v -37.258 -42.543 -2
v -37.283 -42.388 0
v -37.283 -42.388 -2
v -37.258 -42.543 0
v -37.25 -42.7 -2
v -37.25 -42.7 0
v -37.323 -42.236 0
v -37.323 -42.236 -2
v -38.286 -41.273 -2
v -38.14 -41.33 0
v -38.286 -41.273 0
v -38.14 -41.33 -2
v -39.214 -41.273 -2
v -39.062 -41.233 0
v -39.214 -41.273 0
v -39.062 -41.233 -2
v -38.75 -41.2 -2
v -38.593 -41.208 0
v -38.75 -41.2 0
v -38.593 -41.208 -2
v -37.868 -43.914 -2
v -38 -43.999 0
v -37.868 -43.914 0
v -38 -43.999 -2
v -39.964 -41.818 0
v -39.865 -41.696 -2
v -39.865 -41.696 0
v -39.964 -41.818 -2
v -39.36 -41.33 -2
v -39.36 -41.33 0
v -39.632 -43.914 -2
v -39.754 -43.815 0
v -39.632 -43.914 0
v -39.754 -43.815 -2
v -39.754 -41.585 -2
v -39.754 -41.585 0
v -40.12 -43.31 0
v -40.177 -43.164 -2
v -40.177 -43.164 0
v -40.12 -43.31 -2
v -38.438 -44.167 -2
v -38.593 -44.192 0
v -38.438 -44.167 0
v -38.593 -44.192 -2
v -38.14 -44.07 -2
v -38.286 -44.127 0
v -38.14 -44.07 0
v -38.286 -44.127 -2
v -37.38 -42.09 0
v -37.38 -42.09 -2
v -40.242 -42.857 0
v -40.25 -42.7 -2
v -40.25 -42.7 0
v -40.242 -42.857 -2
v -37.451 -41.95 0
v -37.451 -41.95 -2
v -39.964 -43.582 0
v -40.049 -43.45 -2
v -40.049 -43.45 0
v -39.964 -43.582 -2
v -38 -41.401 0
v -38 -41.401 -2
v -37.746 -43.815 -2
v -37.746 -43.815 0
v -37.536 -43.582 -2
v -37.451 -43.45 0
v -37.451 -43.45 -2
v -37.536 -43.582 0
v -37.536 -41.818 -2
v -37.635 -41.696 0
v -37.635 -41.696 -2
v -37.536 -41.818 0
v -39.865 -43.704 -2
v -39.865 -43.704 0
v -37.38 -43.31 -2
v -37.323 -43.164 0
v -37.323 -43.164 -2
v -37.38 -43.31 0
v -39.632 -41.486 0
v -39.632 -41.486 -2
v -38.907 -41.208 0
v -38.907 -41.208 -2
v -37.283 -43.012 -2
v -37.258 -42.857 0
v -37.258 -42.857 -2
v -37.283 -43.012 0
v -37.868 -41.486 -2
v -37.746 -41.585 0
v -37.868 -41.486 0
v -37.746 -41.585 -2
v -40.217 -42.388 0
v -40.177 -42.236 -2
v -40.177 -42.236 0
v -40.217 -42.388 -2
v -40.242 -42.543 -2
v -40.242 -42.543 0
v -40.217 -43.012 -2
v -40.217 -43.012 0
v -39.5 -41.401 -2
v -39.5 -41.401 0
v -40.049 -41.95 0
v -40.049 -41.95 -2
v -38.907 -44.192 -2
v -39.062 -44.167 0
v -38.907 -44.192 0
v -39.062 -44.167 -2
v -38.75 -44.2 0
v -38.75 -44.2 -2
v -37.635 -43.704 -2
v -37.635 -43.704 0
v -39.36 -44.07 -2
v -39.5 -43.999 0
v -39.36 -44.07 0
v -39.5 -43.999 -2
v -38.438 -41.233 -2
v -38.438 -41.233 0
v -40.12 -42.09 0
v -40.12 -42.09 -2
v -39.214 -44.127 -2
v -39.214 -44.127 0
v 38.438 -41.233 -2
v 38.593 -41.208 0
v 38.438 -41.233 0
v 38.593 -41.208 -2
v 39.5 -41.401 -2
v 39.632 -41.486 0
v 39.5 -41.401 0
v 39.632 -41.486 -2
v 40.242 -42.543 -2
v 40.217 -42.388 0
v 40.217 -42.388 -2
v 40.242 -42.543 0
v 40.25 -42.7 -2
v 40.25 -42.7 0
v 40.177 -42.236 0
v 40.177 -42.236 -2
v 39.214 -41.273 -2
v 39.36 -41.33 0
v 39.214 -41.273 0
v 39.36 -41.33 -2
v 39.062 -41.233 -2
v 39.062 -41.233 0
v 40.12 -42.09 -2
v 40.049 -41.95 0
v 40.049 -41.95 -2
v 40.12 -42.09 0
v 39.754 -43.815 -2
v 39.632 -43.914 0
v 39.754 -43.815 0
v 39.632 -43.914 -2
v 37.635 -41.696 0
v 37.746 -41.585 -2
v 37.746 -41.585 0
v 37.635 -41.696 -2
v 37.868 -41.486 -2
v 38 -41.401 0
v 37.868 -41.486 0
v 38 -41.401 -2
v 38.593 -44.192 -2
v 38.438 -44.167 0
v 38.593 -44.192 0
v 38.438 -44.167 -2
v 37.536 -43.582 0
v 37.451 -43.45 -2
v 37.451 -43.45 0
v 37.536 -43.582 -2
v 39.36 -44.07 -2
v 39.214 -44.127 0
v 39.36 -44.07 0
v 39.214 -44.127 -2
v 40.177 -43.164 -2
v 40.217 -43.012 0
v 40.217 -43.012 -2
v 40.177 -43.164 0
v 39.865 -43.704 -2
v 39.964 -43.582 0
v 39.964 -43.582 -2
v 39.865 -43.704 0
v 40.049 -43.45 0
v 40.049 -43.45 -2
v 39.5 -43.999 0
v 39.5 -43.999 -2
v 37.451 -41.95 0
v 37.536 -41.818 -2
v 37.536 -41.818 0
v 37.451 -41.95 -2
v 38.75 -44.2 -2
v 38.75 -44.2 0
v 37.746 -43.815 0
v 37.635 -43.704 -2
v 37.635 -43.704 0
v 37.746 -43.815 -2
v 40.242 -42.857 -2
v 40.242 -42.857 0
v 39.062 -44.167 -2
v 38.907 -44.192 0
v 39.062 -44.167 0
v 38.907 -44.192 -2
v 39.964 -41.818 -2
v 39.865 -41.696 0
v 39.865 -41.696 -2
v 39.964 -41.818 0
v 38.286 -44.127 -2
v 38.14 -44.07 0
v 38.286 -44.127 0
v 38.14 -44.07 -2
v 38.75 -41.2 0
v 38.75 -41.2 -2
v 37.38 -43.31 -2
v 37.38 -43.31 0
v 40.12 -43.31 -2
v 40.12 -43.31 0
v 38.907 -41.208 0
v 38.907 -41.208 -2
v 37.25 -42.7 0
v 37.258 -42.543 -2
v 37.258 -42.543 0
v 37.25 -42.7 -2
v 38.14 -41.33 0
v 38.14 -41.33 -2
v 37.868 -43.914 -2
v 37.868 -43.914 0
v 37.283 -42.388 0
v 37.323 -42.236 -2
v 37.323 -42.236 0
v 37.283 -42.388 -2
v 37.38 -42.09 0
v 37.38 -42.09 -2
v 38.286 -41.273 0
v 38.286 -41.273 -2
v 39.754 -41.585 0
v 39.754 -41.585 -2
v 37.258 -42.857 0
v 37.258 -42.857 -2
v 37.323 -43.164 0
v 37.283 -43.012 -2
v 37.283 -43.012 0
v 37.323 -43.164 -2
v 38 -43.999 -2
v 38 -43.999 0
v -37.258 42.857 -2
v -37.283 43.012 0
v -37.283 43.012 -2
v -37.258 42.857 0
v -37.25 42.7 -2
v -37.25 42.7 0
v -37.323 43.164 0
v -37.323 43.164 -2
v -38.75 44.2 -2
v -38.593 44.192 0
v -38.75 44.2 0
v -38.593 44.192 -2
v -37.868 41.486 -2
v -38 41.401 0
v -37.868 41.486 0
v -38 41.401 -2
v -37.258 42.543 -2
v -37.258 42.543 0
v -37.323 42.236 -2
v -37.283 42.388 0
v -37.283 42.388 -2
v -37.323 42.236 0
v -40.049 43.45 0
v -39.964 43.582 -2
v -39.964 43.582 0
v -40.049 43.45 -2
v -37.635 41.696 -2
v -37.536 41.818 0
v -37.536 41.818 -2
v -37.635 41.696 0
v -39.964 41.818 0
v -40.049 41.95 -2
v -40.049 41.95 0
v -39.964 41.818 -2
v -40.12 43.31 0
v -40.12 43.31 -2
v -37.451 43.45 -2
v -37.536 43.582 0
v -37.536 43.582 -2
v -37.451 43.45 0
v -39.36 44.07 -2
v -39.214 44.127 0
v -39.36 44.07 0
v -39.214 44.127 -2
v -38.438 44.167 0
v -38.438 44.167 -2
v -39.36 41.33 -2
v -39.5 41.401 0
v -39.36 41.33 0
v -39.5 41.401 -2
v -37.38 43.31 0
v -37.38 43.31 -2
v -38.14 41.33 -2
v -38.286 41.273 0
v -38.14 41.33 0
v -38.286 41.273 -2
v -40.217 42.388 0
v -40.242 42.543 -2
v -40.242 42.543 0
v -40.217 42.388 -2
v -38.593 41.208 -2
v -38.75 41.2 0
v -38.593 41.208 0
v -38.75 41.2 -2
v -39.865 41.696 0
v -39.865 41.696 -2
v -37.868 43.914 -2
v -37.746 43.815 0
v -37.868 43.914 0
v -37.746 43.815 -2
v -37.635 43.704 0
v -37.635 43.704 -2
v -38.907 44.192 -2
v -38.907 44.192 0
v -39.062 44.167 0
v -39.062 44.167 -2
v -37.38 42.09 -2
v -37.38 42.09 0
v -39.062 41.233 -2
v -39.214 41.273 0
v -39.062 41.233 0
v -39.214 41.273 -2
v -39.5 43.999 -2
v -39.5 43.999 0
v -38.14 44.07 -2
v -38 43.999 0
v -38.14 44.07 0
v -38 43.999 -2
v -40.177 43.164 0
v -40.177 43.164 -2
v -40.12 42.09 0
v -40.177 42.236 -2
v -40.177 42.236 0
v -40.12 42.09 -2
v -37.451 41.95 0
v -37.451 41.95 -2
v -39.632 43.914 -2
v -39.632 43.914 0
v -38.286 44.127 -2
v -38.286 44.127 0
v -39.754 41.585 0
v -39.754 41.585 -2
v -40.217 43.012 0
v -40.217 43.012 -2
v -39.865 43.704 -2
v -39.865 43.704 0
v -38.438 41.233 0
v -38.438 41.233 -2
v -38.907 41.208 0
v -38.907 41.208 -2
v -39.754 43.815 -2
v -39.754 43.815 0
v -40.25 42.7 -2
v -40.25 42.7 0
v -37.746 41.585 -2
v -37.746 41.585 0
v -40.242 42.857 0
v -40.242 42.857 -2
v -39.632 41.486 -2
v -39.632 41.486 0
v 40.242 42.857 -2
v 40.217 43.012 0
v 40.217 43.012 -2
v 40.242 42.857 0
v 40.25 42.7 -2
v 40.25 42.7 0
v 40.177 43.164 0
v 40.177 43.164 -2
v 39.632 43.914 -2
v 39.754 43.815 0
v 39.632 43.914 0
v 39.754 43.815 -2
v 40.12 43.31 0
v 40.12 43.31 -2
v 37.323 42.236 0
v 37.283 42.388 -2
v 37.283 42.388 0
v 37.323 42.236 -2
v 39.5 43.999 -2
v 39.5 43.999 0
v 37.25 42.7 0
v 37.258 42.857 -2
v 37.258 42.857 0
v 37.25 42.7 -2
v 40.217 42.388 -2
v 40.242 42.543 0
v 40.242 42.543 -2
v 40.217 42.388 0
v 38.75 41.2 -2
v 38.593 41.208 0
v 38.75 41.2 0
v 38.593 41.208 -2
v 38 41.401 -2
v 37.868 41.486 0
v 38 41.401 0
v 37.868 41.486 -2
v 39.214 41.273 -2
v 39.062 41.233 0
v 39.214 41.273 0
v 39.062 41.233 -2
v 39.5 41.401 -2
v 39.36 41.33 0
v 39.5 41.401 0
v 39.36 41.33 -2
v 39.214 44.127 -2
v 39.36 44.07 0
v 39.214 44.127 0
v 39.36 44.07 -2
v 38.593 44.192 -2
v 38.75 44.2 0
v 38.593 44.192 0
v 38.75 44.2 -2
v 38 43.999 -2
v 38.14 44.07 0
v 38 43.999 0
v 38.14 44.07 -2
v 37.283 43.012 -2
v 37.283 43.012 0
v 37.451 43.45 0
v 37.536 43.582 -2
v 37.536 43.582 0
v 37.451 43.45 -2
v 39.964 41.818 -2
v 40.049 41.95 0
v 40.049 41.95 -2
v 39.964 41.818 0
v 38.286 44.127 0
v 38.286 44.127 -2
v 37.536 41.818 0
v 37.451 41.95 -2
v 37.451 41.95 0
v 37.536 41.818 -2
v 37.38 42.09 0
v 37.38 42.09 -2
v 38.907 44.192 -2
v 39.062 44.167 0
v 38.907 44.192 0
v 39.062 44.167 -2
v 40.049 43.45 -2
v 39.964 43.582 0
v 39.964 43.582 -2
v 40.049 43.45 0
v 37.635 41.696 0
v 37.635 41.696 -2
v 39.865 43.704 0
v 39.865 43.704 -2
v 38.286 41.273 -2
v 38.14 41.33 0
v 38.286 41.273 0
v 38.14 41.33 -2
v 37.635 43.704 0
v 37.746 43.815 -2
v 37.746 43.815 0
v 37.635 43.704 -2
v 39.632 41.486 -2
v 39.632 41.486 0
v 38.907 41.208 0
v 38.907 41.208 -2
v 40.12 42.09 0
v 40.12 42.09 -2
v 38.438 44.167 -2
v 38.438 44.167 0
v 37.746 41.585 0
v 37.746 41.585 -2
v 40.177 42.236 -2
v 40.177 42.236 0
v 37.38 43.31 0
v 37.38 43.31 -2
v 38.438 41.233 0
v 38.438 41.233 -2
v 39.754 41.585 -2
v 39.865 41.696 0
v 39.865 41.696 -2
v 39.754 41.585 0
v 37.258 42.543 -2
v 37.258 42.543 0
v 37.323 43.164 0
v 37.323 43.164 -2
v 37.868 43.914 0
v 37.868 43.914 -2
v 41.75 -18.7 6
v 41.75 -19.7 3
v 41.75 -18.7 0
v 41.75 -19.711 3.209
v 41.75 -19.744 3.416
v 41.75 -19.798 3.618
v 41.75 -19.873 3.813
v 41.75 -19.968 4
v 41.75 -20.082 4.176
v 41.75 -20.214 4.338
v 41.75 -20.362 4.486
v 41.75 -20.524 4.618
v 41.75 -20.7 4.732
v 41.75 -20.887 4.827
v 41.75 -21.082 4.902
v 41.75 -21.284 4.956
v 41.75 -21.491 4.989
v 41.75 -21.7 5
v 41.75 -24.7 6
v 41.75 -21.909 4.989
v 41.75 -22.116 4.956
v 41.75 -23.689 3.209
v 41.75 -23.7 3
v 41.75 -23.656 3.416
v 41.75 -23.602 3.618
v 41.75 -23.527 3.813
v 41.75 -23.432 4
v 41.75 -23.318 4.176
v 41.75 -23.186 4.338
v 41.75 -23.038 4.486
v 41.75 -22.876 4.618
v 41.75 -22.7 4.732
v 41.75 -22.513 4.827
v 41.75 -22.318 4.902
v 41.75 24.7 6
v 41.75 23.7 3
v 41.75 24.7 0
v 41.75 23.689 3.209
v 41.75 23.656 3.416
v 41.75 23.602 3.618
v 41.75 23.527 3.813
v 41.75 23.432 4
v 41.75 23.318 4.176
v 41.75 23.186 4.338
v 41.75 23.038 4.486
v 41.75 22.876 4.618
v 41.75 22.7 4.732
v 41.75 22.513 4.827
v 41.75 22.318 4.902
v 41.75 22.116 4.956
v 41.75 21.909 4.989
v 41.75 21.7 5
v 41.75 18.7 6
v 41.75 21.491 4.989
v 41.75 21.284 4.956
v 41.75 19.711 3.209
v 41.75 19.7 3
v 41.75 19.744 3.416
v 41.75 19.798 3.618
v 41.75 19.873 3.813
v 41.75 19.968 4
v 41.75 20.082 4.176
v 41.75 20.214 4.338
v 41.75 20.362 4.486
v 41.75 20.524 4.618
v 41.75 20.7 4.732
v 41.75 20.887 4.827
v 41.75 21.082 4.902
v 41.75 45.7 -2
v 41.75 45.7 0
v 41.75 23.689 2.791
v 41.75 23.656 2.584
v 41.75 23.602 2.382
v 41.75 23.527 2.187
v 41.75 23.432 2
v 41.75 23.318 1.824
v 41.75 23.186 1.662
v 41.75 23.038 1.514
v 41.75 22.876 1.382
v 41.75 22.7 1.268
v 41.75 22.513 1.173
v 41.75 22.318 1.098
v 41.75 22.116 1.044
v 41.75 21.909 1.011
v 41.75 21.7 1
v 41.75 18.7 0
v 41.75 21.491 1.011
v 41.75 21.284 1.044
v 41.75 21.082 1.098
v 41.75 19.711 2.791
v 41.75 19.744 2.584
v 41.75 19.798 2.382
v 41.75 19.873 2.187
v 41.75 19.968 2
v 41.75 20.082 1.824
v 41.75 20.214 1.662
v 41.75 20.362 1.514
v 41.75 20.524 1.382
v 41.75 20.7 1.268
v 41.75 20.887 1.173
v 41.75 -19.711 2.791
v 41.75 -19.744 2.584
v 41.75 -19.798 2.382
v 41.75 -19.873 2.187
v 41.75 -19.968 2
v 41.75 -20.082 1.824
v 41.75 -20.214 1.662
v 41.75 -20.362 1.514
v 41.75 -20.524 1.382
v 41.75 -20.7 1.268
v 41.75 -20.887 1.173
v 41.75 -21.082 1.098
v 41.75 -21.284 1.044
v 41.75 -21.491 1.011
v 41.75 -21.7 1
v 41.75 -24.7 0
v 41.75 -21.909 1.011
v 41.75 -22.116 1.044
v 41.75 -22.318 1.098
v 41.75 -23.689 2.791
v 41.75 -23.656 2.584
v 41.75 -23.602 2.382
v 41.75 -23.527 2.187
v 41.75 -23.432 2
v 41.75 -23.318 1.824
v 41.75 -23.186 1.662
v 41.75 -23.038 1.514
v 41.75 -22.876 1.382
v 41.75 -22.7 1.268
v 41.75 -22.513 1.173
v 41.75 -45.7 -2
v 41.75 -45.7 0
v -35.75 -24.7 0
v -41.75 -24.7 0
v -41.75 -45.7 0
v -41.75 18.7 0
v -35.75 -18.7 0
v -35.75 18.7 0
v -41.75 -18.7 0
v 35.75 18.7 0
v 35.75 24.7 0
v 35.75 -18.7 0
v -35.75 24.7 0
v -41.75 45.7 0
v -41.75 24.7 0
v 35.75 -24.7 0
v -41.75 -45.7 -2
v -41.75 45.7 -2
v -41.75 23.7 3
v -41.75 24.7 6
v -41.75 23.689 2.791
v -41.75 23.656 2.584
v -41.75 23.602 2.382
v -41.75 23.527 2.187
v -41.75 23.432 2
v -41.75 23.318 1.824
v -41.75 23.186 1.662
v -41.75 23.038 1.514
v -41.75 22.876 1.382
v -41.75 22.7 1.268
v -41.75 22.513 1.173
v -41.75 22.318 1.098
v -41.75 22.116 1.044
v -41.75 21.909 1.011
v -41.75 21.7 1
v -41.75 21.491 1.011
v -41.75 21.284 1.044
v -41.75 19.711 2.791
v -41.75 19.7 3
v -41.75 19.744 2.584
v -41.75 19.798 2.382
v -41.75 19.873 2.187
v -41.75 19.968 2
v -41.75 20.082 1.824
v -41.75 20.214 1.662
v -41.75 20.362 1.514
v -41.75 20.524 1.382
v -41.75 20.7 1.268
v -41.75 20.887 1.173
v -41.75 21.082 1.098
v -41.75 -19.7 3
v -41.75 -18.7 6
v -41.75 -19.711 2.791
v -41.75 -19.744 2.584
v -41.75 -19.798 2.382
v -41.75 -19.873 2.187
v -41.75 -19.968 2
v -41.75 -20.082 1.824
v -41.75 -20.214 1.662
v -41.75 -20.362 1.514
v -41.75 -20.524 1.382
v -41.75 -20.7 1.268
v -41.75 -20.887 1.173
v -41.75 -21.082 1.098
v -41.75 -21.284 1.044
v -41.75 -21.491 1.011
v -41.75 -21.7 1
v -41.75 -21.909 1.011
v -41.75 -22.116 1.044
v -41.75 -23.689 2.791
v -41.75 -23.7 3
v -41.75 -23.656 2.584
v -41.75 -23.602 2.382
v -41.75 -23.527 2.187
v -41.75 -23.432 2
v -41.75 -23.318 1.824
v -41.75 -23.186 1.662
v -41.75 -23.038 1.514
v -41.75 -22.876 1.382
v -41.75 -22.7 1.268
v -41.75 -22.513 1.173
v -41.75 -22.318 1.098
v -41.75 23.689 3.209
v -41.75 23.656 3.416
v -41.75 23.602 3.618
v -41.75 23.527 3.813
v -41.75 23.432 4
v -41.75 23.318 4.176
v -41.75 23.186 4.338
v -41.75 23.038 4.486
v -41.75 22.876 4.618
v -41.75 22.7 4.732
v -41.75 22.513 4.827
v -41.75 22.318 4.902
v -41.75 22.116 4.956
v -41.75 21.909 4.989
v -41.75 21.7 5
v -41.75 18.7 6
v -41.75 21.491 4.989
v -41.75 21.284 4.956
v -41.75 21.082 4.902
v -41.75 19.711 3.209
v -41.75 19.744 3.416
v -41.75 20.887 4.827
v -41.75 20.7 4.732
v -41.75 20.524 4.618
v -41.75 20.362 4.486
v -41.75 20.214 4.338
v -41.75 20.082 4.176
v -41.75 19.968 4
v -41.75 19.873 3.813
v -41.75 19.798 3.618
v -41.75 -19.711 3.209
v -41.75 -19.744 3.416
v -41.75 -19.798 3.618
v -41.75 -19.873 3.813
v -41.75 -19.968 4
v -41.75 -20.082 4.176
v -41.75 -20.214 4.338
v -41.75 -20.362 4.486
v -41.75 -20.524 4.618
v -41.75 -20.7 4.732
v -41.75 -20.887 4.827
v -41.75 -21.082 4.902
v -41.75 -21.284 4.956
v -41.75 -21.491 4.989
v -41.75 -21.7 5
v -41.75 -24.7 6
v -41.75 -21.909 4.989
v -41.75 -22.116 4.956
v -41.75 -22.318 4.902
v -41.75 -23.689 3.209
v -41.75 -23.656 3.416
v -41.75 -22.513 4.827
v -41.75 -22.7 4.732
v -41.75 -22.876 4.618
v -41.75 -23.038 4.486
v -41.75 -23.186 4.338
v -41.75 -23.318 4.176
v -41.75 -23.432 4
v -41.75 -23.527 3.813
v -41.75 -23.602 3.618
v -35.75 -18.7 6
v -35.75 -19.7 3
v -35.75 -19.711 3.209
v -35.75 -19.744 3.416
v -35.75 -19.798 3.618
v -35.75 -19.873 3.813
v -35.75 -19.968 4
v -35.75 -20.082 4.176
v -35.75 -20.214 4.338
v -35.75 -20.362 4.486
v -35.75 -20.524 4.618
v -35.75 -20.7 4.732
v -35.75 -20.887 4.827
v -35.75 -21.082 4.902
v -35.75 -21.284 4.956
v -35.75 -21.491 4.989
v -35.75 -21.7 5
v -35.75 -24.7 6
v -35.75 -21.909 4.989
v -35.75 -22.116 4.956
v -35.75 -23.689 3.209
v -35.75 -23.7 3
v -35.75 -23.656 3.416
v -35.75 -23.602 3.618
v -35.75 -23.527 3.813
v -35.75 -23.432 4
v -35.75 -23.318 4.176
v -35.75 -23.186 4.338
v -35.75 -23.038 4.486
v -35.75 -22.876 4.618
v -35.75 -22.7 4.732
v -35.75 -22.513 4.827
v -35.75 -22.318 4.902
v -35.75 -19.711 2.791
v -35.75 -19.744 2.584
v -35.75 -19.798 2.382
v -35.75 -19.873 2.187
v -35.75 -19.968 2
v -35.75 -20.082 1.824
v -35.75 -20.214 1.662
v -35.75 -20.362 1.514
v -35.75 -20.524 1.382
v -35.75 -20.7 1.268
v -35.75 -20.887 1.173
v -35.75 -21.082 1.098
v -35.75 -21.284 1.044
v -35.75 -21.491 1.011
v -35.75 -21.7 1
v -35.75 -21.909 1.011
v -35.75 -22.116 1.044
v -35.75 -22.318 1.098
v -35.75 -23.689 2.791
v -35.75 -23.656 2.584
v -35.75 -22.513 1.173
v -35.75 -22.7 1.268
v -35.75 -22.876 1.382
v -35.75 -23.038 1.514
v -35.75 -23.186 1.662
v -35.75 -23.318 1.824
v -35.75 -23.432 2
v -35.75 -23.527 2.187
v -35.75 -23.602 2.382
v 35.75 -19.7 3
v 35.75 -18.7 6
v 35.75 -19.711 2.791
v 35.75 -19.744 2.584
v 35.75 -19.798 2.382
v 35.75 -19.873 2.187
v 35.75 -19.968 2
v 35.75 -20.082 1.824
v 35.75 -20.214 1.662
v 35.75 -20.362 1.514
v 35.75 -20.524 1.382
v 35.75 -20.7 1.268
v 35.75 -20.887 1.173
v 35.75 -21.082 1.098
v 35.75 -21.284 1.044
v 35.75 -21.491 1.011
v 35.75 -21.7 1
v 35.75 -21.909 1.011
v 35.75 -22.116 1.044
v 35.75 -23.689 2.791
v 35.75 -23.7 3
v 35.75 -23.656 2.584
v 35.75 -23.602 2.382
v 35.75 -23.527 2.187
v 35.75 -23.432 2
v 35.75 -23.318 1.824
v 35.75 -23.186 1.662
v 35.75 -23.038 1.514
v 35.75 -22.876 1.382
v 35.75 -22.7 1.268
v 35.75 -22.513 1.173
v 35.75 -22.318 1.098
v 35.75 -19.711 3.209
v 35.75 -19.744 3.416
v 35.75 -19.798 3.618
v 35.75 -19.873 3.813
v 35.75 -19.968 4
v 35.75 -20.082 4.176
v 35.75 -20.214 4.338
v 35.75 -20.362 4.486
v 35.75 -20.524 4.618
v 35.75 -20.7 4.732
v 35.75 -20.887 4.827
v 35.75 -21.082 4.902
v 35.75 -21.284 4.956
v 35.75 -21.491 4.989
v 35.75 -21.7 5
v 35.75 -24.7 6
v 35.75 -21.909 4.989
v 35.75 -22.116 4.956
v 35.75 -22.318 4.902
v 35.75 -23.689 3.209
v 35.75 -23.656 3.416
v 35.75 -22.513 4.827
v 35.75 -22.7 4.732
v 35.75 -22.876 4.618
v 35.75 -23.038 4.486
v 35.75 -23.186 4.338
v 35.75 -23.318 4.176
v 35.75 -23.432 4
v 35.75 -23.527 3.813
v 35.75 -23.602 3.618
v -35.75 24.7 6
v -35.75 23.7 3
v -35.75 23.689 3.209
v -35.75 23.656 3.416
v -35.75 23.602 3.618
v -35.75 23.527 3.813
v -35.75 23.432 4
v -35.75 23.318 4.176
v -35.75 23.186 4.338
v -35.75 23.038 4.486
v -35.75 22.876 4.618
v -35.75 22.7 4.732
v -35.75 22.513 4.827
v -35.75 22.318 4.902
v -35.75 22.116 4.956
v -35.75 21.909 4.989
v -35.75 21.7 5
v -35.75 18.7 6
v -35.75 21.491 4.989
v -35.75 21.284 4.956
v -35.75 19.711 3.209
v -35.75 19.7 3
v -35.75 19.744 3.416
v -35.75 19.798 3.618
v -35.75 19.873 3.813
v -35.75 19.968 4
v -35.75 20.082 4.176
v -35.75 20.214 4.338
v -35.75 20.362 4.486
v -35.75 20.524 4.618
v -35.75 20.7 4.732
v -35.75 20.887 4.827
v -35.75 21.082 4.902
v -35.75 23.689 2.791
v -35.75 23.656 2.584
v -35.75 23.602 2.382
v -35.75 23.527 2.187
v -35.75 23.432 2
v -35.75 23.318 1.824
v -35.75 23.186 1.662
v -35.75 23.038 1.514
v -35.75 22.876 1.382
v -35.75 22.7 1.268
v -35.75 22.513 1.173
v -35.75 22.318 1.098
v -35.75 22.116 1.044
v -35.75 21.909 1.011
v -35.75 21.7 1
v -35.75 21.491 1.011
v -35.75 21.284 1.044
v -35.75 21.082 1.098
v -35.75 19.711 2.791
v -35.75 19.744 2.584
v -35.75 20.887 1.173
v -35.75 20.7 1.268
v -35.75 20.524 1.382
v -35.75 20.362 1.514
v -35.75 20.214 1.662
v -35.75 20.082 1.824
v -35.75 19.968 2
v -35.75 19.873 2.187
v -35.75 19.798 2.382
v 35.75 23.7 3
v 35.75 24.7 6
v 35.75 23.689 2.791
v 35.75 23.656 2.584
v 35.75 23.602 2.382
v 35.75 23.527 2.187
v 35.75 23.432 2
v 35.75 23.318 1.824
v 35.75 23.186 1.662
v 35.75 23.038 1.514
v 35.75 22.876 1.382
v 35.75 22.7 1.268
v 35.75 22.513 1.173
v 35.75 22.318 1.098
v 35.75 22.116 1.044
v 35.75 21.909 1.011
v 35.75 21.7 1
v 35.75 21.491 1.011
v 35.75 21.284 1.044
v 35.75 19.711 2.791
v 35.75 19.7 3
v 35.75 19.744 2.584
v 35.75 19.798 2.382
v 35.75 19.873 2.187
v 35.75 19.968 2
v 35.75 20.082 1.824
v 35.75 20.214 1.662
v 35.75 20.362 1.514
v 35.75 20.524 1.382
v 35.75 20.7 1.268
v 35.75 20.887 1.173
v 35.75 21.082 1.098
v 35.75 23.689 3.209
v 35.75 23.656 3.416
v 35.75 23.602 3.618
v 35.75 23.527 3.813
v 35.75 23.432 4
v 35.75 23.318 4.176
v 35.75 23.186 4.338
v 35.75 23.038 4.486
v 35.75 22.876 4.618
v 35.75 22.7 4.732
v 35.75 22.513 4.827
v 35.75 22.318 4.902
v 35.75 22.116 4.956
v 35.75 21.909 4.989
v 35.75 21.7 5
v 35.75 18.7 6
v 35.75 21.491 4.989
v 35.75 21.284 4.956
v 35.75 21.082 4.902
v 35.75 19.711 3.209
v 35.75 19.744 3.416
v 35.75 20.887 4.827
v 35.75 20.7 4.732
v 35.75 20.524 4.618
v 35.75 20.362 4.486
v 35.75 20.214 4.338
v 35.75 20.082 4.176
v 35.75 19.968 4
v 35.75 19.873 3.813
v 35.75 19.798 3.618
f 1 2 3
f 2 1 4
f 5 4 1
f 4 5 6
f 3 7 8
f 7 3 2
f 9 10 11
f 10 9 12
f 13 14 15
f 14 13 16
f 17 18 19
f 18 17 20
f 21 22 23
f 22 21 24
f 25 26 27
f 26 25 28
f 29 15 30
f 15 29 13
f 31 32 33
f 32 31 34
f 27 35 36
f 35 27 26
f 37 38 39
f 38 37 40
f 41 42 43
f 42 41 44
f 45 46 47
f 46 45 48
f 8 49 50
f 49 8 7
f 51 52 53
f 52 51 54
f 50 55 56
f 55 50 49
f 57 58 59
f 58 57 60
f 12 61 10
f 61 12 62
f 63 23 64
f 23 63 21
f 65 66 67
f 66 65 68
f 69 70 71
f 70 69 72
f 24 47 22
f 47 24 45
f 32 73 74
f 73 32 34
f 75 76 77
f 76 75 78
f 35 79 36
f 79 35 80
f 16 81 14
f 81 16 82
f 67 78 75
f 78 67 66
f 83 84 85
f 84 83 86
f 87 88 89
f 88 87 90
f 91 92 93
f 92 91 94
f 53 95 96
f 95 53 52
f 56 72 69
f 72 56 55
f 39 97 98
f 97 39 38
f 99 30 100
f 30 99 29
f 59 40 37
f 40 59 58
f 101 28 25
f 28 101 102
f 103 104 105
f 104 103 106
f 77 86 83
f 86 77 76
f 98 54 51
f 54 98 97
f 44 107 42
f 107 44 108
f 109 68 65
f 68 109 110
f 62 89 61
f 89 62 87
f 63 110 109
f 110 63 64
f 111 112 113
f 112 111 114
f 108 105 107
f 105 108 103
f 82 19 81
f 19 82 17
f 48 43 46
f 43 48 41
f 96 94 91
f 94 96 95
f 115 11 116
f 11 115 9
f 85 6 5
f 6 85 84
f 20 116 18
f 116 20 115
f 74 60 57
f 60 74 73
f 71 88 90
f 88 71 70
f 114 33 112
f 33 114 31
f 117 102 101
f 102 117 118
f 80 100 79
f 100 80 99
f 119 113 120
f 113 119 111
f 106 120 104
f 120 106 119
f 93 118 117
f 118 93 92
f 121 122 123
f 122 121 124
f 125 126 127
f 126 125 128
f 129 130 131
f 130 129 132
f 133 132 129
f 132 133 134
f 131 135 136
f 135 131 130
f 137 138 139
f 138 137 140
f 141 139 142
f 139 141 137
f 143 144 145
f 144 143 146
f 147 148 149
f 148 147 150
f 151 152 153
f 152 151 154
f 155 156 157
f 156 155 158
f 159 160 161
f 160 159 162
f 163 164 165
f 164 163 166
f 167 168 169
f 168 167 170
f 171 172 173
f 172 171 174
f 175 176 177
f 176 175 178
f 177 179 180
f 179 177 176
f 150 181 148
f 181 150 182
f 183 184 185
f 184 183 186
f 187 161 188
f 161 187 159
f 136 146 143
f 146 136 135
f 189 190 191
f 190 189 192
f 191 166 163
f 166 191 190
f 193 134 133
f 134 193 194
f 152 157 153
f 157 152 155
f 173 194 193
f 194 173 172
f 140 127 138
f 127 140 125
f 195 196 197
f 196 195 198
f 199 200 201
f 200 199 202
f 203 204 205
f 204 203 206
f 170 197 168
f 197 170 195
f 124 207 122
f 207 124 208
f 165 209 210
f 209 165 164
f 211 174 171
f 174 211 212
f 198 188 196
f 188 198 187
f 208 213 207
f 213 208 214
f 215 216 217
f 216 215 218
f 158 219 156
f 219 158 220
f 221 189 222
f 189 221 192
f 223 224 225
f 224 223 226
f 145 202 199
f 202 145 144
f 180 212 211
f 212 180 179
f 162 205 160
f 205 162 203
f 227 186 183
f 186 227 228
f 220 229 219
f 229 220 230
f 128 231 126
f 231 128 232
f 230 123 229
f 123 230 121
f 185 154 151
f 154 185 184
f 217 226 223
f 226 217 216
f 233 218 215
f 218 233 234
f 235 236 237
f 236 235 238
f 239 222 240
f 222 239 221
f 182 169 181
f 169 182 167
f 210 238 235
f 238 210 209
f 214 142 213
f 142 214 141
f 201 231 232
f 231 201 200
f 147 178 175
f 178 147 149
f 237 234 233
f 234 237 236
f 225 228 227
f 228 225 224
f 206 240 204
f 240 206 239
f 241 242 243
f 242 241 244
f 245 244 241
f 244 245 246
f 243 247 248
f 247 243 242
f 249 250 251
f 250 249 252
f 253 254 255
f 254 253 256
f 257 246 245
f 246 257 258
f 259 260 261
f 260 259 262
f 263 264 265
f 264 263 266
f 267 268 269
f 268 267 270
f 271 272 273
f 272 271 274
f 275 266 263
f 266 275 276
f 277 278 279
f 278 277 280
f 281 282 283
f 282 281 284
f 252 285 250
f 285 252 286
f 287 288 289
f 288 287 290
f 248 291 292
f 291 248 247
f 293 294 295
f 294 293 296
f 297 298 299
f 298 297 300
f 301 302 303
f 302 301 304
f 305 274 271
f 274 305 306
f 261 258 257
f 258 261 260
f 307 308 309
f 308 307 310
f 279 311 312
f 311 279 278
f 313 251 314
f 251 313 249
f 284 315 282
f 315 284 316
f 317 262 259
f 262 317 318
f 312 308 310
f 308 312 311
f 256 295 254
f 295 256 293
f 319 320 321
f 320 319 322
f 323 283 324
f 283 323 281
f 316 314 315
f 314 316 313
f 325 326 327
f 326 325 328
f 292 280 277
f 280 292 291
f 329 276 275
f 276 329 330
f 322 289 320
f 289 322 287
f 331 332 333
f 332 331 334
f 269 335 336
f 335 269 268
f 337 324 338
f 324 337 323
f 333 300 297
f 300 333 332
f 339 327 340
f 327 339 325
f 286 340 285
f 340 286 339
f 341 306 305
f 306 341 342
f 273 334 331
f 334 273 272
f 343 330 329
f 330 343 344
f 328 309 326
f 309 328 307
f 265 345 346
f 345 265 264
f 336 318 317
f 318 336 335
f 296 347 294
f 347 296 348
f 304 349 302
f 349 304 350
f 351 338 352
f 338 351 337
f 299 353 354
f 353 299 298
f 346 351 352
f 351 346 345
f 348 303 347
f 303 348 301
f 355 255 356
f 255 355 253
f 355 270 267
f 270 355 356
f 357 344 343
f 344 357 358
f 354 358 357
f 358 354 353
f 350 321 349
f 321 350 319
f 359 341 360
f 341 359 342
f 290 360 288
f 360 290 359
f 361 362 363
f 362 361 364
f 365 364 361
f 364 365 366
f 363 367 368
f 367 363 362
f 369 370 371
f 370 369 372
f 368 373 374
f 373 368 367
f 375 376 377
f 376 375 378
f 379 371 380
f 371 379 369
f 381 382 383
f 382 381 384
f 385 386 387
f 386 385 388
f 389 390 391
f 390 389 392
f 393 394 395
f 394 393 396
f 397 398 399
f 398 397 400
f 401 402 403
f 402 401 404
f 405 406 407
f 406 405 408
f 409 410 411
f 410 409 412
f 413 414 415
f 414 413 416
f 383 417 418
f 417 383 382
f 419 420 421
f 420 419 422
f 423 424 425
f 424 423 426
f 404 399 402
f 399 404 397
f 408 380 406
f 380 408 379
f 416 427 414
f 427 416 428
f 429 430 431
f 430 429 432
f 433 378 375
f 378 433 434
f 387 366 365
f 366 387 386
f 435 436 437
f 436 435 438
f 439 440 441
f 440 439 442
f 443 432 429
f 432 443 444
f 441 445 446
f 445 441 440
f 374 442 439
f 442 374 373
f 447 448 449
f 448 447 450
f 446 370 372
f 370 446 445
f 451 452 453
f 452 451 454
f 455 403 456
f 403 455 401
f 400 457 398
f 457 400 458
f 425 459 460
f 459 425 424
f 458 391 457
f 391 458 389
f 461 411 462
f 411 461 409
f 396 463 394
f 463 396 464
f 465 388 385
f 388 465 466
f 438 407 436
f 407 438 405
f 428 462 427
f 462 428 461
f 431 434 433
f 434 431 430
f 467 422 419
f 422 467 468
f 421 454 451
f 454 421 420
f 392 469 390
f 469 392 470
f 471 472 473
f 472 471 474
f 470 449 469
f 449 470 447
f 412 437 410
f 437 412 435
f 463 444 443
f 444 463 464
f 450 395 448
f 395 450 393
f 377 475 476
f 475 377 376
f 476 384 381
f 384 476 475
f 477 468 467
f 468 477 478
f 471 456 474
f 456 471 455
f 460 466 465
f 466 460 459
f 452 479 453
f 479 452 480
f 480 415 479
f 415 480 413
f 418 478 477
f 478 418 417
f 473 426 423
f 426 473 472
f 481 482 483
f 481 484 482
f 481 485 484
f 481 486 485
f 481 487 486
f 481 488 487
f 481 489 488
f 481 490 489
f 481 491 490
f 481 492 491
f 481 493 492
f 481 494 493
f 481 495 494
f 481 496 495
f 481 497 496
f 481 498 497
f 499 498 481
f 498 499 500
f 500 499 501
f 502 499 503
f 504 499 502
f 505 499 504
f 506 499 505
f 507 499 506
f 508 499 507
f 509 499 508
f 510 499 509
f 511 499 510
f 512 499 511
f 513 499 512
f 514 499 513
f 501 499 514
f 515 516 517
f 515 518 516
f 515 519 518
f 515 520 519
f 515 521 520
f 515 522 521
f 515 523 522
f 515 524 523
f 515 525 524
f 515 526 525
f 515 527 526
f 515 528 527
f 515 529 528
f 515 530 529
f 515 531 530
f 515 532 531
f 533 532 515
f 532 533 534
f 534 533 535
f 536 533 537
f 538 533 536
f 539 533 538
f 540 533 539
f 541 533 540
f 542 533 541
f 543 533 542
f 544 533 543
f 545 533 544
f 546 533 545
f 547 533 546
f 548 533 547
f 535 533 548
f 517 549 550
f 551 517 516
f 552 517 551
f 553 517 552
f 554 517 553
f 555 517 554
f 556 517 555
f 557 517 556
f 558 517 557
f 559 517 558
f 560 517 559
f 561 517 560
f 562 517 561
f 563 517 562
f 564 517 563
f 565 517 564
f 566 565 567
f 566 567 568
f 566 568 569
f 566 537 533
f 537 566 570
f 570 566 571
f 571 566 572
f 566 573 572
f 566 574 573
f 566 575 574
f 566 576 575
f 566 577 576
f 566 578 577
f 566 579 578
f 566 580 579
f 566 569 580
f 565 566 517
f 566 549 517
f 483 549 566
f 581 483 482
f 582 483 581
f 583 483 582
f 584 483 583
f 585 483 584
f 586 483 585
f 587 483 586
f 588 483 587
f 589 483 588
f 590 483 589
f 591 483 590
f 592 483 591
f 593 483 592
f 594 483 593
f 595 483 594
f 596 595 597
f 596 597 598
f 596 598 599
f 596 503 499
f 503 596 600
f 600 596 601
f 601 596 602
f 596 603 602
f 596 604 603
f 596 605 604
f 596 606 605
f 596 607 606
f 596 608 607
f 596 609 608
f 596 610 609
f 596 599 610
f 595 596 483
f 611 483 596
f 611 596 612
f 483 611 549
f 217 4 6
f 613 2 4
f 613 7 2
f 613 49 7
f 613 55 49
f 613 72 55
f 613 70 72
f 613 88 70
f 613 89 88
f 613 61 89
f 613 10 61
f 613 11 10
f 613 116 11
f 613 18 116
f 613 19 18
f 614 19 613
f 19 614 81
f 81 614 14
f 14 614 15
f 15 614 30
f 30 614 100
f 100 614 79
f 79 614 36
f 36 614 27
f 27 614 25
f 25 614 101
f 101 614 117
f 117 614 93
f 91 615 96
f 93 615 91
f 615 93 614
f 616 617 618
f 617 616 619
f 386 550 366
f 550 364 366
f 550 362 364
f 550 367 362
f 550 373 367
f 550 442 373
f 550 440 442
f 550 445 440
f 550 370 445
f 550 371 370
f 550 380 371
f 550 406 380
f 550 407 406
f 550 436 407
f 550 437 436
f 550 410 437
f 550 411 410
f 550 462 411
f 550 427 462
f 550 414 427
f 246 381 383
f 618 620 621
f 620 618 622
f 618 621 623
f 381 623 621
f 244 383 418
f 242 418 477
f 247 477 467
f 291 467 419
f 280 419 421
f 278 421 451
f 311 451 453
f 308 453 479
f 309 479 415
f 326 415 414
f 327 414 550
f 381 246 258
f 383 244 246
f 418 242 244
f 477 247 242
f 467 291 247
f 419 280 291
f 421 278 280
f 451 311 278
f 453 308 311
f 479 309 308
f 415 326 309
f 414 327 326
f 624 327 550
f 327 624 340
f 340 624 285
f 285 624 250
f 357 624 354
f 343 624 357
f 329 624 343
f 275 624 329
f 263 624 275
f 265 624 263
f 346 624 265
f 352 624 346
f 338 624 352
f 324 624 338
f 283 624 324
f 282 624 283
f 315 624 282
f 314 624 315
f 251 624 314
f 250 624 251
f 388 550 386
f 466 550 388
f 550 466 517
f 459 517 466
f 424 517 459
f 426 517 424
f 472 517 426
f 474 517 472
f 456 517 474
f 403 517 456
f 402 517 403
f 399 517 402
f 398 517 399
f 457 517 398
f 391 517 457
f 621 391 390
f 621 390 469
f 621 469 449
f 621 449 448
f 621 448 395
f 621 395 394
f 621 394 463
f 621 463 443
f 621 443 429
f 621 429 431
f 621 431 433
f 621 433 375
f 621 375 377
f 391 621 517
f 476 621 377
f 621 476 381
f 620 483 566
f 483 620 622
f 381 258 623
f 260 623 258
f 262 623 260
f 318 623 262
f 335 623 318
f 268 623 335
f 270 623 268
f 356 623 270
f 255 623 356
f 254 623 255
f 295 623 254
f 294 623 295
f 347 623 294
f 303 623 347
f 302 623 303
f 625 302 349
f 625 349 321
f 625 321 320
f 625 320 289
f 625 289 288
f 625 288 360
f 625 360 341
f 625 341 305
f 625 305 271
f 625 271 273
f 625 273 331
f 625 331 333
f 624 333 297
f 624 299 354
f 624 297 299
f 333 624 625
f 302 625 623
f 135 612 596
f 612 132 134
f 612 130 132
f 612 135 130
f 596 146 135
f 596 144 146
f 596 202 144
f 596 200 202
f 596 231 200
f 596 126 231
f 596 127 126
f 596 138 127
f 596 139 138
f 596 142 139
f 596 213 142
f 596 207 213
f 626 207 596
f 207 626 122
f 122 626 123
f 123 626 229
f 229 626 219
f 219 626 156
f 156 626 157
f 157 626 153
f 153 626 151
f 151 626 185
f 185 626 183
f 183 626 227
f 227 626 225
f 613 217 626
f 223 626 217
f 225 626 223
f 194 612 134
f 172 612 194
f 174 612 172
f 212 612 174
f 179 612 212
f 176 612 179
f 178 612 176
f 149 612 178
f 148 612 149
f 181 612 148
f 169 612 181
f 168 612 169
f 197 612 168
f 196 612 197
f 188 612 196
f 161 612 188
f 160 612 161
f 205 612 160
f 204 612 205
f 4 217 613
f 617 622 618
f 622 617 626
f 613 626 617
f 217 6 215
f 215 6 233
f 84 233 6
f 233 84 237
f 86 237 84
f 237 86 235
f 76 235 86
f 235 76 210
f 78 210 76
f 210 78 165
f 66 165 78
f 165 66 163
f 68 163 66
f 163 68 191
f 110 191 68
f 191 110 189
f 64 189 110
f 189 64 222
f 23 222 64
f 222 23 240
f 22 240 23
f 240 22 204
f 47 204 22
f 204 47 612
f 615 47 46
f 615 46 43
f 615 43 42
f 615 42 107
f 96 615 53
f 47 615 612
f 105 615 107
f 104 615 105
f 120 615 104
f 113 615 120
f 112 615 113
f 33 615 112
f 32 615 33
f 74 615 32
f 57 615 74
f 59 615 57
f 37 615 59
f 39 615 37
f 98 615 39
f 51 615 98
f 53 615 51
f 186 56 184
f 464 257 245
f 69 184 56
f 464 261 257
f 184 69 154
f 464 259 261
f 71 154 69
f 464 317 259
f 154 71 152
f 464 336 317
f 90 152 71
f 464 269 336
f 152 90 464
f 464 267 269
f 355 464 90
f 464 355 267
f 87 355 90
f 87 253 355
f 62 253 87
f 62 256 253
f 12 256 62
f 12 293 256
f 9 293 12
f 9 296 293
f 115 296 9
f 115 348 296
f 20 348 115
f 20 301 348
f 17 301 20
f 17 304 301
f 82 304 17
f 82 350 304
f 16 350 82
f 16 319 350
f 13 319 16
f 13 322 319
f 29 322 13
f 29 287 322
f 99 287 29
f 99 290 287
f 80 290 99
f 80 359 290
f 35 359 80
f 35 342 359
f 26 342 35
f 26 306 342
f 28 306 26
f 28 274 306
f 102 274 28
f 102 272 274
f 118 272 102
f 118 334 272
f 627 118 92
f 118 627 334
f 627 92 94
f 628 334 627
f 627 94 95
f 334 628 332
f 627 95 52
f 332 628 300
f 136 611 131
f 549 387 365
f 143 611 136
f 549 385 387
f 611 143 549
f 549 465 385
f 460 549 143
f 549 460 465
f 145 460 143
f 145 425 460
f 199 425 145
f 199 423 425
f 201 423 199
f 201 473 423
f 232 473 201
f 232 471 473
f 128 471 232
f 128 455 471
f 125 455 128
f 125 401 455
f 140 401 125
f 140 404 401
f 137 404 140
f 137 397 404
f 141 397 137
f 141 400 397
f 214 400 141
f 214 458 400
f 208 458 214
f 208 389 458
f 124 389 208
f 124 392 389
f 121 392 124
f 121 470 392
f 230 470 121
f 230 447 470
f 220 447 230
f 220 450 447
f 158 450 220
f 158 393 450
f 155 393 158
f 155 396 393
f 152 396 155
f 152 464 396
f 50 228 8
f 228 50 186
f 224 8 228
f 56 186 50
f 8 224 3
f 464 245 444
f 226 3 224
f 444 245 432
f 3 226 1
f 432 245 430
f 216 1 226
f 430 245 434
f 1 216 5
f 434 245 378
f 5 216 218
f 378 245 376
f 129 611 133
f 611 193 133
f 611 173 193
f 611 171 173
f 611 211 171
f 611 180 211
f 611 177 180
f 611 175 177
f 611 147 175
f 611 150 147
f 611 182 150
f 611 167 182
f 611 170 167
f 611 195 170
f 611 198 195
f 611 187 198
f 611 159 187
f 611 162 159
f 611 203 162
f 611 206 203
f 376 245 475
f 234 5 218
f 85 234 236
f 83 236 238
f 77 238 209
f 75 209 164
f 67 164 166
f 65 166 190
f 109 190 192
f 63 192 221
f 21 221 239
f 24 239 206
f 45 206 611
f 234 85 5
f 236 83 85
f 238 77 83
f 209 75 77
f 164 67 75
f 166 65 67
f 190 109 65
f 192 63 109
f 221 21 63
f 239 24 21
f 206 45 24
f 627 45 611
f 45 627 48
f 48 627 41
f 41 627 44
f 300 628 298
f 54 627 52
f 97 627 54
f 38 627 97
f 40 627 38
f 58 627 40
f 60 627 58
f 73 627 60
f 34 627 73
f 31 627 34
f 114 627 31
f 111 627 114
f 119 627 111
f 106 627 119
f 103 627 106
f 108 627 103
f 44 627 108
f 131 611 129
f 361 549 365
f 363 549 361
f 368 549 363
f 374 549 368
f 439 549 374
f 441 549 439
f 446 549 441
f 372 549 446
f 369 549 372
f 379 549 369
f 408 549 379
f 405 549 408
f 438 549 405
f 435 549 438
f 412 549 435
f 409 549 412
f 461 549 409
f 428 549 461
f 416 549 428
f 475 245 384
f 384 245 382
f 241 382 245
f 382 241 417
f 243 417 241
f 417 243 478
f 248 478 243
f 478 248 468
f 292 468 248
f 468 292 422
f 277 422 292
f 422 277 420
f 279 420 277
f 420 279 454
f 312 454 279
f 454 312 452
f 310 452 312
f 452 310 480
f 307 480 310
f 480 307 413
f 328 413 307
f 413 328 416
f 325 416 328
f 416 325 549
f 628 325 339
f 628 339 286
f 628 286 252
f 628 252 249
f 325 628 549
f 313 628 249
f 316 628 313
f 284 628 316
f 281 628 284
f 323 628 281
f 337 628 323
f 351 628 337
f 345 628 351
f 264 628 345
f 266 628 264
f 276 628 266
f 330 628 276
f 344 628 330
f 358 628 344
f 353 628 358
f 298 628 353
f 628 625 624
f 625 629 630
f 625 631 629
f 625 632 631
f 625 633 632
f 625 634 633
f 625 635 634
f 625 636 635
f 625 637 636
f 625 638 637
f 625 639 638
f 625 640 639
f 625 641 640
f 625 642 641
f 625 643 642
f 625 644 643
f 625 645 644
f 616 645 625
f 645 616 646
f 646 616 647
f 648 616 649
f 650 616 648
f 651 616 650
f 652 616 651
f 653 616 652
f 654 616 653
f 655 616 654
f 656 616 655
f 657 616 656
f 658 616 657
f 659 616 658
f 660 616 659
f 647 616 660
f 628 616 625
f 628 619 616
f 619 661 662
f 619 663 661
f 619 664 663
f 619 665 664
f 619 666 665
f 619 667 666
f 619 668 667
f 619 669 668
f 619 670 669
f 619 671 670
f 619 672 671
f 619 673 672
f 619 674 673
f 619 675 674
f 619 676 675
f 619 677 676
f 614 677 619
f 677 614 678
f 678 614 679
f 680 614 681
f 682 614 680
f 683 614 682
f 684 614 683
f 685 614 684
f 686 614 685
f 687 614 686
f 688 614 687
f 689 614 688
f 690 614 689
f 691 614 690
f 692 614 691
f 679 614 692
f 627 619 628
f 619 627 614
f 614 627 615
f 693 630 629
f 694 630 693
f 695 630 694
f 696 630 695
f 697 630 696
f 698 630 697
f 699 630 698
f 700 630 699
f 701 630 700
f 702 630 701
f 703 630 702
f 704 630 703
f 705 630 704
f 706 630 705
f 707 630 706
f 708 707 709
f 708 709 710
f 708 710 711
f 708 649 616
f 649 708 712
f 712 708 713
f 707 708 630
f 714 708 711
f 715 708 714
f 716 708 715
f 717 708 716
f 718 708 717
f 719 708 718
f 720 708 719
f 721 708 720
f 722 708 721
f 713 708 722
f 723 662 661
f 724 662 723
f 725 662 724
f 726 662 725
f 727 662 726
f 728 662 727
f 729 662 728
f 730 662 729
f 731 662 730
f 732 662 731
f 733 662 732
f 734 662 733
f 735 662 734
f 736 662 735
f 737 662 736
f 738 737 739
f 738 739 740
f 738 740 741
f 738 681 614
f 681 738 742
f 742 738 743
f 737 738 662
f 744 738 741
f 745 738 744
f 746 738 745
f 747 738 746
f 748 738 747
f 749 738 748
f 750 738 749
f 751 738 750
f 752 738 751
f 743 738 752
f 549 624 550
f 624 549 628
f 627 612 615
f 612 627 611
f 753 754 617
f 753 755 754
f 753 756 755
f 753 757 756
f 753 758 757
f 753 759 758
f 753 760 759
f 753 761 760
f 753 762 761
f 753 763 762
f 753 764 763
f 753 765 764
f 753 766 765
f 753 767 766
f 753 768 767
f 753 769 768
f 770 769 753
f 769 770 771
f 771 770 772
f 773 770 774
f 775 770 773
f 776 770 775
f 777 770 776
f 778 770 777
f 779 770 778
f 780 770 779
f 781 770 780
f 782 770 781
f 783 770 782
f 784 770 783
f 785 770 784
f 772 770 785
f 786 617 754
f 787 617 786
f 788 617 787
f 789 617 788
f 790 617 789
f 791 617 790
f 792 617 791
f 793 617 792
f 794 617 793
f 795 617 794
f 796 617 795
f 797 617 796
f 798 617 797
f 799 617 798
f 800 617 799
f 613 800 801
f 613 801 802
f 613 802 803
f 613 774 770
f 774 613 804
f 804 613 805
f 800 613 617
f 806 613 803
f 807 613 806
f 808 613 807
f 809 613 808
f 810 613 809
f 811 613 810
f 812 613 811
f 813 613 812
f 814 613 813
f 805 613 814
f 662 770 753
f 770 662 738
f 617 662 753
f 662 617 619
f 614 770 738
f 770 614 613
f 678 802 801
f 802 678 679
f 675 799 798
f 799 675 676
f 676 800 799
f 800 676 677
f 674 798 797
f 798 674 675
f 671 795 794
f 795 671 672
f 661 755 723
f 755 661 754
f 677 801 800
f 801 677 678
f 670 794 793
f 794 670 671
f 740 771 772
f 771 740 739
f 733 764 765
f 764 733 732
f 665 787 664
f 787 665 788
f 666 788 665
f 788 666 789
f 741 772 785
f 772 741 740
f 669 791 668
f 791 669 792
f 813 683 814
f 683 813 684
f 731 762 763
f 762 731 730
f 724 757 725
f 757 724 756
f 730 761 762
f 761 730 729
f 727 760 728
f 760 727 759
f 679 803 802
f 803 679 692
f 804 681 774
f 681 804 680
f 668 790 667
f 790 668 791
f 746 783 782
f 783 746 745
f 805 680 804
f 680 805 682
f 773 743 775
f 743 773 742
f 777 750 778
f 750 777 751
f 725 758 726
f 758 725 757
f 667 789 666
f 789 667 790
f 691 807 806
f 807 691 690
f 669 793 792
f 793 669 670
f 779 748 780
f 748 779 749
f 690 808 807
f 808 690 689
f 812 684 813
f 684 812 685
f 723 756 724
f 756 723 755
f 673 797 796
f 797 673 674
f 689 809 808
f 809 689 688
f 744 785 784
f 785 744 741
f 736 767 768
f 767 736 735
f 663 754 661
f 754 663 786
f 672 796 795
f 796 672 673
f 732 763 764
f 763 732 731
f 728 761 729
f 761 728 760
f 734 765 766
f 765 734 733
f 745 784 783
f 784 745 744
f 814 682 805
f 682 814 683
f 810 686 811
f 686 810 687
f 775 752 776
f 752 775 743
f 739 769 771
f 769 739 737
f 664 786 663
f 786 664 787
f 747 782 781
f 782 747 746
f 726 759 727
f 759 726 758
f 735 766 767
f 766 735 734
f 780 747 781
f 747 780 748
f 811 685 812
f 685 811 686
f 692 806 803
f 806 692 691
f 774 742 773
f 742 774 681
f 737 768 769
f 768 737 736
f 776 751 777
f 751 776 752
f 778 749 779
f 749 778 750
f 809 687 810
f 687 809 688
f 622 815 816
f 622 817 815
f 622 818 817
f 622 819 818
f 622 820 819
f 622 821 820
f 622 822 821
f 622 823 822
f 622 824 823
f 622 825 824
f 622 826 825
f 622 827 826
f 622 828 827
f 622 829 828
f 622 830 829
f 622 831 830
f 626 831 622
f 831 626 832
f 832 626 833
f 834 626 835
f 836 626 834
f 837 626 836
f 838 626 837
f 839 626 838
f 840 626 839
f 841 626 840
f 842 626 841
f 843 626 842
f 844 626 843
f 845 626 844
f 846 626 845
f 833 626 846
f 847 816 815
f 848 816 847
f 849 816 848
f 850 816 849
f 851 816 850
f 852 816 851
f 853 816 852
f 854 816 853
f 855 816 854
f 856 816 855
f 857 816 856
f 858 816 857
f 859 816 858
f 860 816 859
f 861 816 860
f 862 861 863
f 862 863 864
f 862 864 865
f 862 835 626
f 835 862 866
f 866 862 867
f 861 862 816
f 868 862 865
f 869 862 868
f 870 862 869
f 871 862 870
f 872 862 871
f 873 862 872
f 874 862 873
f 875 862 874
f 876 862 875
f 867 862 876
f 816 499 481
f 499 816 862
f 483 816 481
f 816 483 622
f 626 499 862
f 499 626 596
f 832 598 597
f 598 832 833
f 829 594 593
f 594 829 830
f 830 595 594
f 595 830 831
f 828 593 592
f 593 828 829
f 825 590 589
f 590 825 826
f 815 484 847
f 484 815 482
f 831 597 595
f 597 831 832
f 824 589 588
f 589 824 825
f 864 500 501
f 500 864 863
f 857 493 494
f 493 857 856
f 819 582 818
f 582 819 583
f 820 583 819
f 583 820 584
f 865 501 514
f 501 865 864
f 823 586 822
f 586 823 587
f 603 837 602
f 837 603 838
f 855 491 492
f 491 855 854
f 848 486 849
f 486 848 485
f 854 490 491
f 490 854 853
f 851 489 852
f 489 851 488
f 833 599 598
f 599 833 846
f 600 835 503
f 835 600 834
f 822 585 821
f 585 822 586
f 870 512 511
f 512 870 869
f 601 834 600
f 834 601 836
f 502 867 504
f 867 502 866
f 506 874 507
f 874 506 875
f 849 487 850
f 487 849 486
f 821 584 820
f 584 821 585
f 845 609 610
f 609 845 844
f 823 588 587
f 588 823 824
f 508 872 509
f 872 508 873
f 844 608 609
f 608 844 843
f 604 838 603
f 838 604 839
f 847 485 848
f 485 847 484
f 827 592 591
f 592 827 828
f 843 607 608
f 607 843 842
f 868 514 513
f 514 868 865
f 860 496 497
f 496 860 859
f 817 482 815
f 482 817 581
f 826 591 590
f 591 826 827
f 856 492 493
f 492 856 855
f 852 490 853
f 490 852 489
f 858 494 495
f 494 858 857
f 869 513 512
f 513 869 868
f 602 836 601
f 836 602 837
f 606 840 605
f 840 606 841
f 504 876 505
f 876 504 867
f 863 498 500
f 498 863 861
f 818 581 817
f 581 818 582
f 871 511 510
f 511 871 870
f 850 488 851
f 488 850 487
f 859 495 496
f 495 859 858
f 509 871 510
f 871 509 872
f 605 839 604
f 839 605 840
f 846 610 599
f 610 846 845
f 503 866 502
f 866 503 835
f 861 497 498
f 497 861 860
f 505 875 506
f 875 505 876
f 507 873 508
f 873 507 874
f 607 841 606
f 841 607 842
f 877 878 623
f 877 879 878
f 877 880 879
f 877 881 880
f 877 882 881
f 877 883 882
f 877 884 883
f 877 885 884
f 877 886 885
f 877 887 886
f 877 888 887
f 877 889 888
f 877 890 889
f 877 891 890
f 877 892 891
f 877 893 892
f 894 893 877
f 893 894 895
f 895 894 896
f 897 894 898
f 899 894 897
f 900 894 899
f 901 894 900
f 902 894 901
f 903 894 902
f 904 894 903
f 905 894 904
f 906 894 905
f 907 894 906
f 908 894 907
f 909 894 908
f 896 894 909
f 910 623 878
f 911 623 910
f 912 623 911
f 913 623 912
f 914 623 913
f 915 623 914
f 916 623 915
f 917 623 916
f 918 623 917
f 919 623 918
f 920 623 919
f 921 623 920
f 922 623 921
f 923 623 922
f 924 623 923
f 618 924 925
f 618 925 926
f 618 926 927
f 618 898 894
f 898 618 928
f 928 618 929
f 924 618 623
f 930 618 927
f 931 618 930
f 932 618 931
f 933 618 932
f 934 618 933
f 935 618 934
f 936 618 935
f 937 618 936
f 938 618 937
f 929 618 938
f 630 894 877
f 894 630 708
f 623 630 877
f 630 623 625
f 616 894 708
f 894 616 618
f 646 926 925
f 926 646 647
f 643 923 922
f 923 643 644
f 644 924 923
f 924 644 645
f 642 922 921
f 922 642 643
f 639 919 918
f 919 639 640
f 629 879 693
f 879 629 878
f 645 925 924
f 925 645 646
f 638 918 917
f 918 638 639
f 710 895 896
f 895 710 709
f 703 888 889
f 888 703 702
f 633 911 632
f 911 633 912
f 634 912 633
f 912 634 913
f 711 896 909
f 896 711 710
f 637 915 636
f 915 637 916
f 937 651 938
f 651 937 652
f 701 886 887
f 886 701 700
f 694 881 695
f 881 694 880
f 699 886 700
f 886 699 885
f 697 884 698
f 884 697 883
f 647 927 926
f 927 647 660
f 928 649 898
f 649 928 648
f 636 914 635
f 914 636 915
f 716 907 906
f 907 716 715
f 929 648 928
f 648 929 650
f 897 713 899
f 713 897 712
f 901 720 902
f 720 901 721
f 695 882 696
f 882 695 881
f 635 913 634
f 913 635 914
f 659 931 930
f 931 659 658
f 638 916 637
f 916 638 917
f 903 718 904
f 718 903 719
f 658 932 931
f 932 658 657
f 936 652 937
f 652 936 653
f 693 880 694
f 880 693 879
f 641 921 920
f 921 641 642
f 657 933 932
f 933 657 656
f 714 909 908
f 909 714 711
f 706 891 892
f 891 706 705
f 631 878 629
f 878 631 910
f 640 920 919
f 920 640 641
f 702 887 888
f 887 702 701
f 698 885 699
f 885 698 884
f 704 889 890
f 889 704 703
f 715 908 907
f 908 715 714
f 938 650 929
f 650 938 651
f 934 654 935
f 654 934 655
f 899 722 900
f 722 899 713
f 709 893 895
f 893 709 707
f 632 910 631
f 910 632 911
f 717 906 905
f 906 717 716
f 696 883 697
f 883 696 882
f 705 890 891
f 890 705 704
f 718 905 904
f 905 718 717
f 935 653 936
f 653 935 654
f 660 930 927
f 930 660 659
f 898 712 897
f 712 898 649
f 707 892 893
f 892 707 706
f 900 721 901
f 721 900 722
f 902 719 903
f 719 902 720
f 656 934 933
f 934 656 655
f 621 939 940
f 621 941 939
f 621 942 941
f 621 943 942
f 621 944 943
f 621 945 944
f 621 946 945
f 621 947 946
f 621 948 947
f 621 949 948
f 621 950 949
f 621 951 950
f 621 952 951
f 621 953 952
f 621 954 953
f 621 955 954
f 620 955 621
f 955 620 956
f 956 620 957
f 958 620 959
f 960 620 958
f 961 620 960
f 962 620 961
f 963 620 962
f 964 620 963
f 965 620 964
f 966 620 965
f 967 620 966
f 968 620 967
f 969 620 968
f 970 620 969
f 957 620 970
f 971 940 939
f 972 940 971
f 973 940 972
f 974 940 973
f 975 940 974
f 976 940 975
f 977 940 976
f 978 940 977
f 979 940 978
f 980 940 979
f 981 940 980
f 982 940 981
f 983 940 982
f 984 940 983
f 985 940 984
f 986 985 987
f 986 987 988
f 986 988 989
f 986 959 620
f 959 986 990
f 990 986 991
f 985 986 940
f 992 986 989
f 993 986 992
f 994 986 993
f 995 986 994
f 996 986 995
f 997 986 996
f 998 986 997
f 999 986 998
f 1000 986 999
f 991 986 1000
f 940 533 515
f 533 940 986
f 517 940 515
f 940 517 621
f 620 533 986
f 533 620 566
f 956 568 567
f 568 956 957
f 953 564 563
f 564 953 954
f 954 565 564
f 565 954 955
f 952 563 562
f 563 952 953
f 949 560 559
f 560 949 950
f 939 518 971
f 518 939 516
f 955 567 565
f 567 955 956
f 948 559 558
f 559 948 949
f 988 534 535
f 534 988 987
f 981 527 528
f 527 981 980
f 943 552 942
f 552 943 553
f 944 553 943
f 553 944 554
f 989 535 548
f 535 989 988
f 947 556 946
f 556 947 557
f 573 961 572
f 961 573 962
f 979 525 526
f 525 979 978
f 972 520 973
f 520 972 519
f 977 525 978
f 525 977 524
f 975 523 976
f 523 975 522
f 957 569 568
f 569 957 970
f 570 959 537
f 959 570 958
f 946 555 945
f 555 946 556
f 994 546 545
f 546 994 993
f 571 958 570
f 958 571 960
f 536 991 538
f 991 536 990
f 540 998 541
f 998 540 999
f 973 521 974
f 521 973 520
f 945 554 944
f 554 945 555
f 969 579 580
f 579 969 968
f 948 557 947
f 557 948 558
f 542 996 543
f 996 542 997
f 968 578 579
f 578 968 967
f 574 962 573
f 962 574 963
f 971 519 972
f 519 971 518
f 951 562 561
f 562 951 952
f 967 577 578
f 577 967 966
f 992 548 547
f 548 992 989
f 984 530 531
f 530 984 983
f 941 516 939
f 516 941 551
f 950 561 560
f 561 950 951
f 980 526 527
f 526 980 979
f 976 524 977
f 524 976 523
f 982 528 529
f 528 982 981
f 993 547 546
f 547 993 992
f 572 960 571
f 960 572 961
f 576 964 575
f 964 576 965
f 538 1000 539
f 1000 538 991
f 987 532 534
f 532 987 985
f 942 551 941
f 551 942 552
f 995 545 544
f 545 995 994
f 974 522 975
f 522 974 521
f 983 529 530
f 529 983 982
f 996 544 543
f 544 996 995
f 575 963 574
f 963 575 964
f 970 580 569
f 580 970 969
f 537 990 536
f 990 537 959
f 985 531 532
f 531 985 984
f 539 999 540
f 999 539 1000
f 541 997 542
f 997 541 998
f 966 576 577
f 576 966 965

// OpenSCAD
size_out = 10;

size_x=68.5;
size_y=93.9;
size_z=36.5;

size_wheel_z=5;
size_wheel_rad=15;
o_ring_dia=2;

size_wall=1.5;
tolerance=1;

screw_size=3;

card_slot=4;

module mount() // дупки резбова втулка
{
	difference()
	{
		cube([screw_size*2,screw_size*2,screw_size*2], center=true);
		
		cylinder(d=screw_size+1,h=screw_size*2+1, $fn=60, center=true);
	}
}

*union() // left/right
{
	translate([0,0,-size_wall/2])
	cube([size_z ,size_y-size_out,size_wall], center=true);
	
	for(y=[-1:2:1])
	{
		for(x=[-1:2:1])
		{
			translate([(size_z/2-screw_size)*x,((size_y-size_out)/2-screw_size)*y,screw_size])
			rotate([0,90,0])
			mount();
		}
	}
	
	translate([0,((size_y-size_out)/2-screw_size),screw_size])
	rotate([90,0,0])
	mount();
}

*union() //front
{
	
	translate([0,0,-size_wall/2])
	{
		difference()
		{
			 cube([size_x+(screw_size*2+size_wall)*2,size_z-card_slot,size_wall], center=true);
			for(x=[-1:2:1])
			{
				translate([x*(size_x/2+(screw_size*2+size_wall)-screw_size),-card_slot/2,0])
				cylinder(h=size_wall+1,d=screw_size, $fn=60, center=true);
			}
		}
	}
	
	for(x=[-1:2:1])
	{
		translate([x*(size_x/2+(screw_size*2+size_wall)-screw_size),(size_z-card_slot)/2-screw_size,screw_size])
		rotate([90,0,0])
		mount();
	}
	
}

*union() // top
{
	translate([0,0,-size_wall/2])
	difference()
	{
		cube([size_x+2*(size_wall+screw_size*2),size_y-size_out,size_wall], center=true);
		
		for(y=[-1:2:1])
		{
			for(x=[-1:2:1])
			{
				translate([((size_x+2*(size_wall+screw_size*2))/2-screw_size)*x,((size_y-size_out)/2-screw_size)*y,0])
				cylinder(h=size_wall+1, d=screw_size, $fn=60, center=true);
			}
		}
		
		translate([0,(size_y-size_out)/4,0])
		cube([size_wheel_z+tolerance,size_wheel_rad*2+o_ring_dia+tolerance,size_wall+1],center=true);
	}
	
	for(y=[-1:2:1])
	{
		translate([21.5-screw_size,(size_y-size_out)/4+(6+screw_size+size_wall)*y,screw_size])
		rotate([0,90,0])
		mount();
	}
	
}

union() // bottom
{
	translate([0,0,-(size_wall+0.5)/2])
	difference()
	{
		cube([size_x+2*(size_wall+screw_size*2),size_y-size_out+screw_size*2+size_wall,size_wall+0.5], center=true);
		
		for(y=[-1:2:1])
		{
			for(x=[-1:2:1])
			{
				translate([((size_x+2*(size_wall+screw_size*2))/2-screw_size)*x,((size_y-size_out+screw_size*2+size_wall)/2-screw_size)*y,0])
				cylinder(h=size_wall+1, d=screw_size, $fn=60, center=true);
			}
		}
	}
	
	for(y=[-1:2:1])
	{
		for(x=[-1:2:1])
		{
			translate([(size_x+2*(size_wall+screw_size))/2*x,((size_y-size_out+screw_size*2+size_wall)/2-screw_size*8)*y,screw_size])
			rotate([0,90,0])
			mount();
		}
	}
}
